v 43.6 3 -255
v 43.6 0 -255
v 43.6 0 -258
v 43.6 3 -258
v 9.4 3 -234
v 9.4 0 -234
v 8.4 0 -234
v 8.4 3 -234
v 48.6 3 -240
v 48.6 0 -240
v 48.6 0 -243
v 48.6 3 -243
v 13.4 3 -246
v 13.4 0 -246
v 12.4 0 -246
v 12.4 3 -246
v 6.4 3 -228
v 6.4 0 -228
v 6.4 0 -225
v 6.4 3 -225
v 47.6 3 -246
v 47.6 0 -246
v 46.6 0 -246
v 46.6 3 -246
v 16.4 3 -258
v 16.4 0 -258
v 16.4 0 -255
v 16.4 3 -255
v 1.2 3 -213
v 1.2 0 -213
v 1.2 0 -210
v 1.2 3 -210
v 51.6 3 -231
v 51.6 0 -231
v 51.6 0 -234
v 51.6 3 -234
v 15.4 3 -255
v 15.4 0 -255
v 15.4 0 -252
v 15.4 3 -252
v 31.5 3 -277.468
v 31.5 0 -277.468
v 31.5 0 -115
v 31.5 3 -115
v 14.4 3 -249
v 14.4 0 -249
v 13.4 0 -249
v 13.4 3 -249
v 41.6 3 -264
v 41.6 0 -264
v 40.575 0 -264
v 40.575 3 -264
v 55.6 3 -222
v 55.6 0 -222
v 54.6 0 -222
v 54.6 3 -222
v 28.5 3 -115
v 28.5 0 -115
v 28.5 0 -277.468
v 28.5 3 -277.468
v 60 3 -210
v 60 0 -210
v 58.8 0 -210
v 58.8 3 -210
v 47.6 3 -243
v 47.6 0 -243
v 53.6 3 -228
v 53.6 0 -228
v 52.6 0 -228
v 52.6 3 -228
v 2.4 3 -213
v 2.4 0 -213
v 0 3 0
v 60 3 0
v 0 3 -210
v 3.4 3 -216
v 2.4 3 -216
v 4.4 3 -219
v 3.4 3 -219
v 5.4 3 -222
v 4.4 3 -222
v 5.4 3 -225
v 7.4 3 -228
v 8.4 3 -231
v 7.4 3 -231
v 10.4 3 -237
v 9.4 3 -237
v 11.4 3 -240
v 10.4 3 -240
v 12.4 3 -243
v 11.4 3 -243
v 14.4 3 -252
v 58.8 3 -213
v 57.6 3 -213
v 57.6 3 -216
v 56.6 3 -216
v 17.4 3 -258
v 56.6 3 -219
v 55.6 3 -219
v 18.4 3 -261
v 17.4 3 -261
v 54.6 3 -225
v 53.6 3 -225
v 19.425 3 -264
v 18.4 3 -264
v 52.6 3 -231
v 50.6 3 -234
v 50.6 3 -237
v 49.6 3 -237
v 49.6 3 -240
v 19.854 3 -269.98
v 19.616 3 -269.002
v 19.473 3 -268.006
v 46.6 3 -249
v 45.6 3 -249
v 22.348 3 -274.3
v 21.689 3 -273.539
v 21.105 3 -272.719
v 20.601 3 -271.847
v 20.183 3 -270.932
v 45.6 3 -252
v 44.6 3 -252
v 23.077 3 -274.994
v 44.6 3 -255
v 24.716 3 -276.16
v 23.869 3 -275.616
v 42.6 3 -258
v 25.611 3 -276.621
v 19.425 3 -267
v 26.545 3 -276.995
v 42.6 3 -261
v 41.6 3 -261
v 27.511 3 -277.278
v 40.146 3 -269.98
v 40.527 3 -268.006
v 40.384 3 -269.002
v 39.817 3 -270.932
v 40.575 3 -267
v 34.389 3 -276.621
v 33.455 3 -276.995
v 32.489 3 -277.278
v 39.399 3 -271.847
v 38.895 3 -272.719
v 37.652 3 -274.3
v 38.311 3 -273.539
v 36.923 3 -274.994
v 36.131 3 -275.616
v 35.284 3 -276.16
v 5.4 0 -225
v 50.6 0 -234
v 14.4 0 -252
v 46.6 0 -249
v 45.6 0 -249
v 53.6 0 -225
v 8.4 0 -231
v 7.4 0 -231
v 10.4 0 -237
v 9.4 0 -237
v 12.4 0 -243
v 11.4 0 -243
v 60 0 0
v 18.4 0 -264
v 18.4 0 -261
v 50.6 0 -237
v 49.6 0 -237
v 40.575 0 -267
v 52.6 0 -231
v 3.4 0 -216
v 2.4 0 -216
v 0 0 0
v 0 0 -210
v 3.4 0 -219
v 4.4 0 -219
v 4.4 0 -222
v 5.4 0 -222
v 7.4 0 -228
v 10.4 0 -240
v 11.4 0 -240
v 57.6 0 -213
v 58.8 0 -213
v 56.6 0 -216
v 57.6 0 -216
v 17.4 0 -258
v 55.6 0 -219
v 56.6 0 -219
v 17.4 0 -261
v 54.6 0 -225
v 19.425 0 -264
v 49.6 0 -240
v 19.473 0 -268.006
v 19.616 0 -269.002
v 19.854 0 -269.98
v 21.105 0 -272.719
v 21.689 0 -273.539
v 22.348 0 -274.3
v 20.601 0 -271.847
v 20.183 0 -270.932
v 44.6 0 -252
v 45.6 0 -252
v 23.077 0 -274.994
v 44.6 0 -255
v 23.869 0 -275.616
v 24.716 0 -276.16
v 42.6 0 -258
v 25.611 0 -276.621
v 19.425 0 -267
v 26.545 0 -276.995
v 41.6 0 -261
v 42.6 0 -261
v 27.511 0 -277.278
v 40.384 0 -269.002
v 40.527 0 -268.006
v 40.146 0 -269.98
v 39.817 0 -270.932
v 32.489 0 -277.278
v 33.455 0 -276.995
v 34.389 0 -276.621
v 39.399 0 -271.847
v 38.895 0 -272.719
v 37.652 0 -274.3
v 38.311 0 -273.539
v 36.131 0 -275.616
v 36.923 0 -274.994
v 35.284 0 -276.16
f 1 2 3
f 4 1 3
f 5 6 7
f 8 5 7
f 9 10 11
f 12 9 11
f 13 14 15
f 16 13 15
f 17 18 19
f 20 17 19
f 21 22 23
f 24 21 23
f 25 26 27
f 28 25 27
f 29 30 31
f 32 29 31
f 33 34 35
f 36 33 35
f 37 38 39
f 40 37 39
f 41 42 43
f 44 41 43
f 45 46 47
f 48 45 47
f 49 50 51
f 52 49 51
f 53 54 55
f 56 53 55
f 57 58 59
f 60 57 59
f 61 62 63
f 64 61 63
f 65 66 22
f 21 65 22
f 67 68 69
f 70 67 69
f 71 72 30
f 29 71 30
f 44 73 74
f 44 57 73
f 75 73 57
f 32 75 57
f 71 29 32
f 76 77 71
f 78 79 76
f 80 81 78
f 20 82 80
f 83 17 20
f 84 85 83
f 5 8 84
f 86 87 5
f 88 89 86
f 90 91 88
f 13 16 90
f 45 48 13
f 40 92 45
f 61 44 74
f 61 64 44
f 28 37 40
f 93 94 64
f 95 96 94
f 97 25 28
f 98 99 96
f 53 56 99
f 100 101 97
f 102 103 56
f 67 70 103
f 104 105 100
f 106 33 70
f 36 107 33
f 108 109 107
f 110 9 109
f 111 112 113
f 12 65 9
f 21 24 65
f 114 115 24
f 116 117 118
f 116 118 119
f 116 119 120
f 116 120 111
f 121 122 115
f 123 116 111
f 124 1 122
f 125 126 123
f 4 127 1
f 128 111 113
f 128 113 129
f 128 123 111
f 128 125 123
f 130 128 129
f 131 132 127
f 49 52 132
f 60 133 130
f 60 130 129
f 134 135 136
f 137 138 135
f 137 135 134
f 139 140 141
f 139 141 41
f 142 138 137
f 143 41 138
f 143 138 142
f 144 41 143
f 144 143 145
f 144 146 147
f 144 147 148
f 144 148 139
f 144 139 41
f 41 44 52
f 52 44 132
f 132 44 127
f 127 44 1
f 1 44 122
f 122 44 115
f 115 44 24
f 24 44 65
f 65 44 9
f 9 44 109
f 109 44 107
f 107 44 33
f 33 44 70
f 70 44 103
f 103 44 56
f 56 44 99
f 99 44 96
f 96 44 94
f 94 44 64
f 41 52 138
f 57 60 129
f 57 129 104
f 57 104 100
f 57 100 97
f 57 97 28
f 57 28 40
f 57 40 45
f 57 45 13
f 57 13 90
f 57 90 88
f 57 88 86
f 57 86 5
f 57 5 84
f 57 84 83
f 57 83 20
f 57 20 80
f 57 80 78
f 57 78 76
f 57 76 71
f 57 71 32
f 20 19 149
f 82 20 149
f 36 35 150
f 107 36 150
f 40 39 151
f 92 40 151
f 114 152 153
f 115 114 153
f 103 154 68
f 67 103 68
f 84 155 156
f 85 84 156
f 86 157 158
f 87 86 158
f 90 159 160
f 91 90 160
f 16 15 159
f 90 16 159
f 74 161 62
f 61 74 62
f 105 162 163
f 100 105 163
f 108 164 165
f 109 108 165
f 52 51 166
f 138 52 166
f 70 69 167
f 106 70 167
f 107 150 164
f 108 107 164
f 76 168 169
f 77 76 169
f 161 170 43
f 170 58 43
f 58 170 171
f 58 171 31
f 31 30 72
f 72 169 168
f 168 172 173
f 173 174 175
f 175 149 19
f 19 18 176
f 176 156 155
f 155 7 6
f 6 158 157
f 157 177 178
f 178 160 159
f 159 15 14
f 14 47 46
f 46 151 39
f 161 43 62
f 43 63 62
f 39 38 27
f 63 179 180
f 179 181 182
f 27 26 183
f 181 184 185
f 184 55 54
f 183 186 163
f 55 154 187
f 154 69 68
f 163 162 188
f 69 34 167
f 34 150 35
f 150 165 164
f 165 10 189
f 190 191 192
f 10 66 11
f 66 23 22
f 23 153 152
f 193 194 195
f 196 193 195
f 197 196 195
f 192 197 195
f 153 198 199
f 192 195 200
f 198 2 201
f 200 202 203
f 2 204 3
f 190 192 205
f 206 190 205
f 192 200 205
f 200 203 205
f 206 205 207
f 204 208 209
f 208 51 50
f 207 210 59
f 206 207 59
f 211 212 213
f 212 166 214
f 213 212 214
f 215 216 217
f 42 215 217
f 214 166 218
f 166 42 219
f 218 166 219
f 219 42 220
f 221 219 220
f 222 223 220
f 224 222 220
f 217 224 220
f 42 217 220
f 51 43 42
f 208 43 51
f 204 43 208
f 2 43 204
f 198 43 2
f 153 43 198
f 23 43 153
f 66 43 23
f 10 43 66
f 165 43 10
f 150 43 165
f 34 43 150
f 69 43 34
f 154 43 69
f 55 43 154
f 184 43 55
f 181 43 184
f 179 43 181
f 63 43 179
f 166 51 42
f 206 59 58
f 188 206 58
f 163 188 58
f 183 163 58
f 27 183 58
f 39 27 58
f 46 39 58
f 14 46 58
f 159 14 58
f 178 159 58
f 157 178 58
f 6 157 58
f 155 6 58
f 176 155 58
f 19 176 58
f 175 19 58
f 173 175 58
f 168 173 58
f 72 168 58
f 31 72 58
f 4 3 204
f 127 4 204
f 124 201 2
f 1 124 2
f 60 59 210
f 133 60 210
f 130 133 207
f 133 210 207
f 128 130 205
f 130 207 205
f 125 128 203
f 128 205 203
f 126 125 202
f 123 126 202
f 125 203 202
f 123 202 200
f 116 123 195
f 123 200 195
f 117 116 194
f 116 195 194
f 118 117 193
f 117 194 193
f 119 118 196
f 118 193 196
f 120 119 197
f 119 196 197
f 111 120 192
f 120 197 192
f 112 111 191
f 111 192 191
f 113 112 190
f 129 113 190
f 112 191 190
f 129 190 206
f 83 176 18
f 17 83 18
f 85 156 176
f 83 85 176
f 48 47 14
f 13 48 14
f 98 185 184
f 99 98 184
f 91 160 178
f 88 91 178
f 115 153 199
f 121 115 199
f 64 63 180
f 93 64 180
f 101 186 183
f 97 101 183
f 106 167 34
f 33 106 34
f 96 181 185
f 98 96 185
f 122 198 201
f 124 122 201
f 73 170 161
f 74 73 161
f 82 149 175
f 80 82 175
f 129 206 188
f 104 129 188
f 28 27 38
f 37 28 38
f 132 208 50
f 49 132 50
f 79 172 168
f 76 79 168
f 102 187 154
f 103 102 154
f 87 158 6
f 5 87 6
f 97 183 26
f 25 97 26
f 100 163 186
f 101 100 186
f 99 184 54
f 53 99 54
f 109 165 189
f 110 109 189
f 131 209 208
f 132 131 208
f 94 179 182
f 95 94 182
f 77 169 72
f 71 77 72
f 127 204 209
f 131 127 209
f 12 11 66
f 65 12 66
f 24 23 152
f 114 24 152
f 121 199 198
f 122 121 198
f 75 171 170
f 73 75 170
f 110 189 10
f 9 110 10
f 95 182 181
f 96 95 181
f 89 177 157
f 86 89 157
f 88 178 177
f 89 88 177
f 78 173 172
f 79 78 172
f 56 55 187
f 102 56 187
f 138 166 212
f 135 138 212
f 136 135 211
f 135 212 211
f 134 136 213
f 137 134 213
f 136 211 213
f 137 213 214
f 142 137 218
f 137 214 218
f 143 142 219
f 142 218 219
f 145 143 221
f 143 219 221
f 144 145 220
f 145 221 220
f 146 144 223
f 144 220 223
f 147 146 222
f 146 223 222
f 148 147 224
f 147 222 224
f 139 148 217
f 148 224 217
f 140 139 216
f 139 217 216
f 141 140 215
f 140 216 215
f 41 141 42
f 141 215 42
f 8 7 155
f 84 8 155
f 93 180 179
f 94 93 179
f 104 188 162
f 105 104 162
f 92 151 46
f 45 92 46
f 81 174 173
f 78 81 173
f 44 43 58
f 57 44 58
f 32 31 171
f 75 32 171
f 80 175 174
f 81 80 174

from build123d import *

# Parameters (mm, degrees)
SALIENTE_EXTRUIR1_DEPTH = 3


with BuildPart() as part:
    # Croquis1 → Saliente-Extruir1 (new body)
    with BuildSketch(Plane(origin=(0, 0, 0), x_dir=(1, 0, 0), z_dir=(0, 1, 0))):
        with BuildLine():
            Line((0, 0), (60, 0))
            Line((60, 0), (60, 210))
            Line((60, 210), (58.8, 210))
            Line((58.8, 210), (58.8, 213))
            Line((58.8, 213), (57.6, 213))
            Line((57.6, 213), (57.6, 216))
            Line((57.6, 216), (56.6, 216))
            Line((56.6, 216), (56.6, 219))
            Line((56.6, 219), (55.6, 219))
            Line((55.6, 219), (55.6, 222))
            Line((55.6, 222), (54.6, 222))
            Line((54.6, 222), (54.6, 225))
            Line((54.6, 225), (53.6, 225))
            Line((53.6, 225), (53.6, 228))
            Line((53.6, 228), (52.6, 228))
            Line((52.6, 228), (52.6, 231))
            Line((52.6, 231), (51.6, 231))
            Line((51.6, 231), (51.6, 234))
            Line((51.6, 234), (50.6, 234))
            Line((50.6, 234), (50.6, 237))
            Line((50.6, 237), (49.6, 237))
            Line((49.6, 237), (49.6, 240))
            Line((49.6, 240), (48.6, 240))
            Line((48.6, 240), (48.6, 243))
            Line((48.6, 243), (47.6, 243))
            Line((47.6, 243), (47.6, 246))
            Line((47.6, 246), (46.6, 246))
            Line((46.6, 246), (46.6, 249))
            Line((46.6, 249), (45.6, 249))
            Line((45.6, 249), (45.6, 252))
            Line((45.6, 252), (44.6, 252))
            Line((44.6, 252), (44.6, 255))
            Line((44.6, 255), (43.6, 255))
            Line((43.6, 255), (43.6, 258))
            Line((43.6, 258), (42.6, 258))
            Line((42.6, 258), (42.6, 261))
            Line((42.6, 261), (41.6, 261))
            Line((41.6, 261), (41.6, 264))
            Line((41.6, 264), (40.575, 264))
            Line((40.575, 264), (40.575, 267))
            ThreePointArc((40.575, 267), (37.990404402, 273.927052945), (31.5, 277.468076471))
            Line((31.5, 277.468076471), (31.5, 115))
            Line((31.5, 115), (28.5, 115))
            Line((28.5, 115), (28.5, 277.468076471))
            ThreePointArc((28.5, 277.468076471), (22.009595598, 273.927052945), (19.425, 267))
            Line((19.425, 267), (19.425, 264))
            Line((19.425, 264), (18.4, 264))
            Line((18.4, 264), (18.4, 261))
            Line((18.4, 261), (17.4, 261))
            Line((17.4, 261), (17.4, 258))
            Line((17.4, 258), (16.4, 258))
            Line((16.4, 258), (16.4, 255))
            Line((16.4, 255), (15.4, 255))
            Line((15.4, 255), (15.4, 252))
            Line((15.4, 252), (14.4, 252))
            Line((14.4, 252), (14.4, 249))
            Line((14.4, 249), (13.4, 249))
            Line((13.4, 249), (13.4, 246))
            Line((13.4, 246), (12.4, 246))
            Line((12.4, 246), (12.4, 243))
            Line((12.4, 243), (11.4, 243))
            Line((11.4, 243), (11.4, 240))
            Line((11.4, 240), (10.4, 240))
            Line((10.4, 240), (10.4, 237))
            Line((10.4, 237), (9.4, 237))
            Line((9.4, 237), (9.4, 234))
            Line((9.4, 234), (8.4, 234))
            Line((8.4, 234), (8.4, 231))
            Line((8.4, 231), (7.4, 231))
            Line((7.4, 231), (7.4, 228))
            Line((7.4, 228), (6.4, 228))
            Line((6.4, 228), (6.4, 225))
            Line((6.4, 225), (5.4, 225))
            Line((5.4, 225), (5.4, 222))
            Line((5.4, 222), (4.4, 222))
            Line((4.4, 222), (4.4, 219))
            Line((4.4, 219), (3.4, 219))
            Line((3.4, 219), (3.4, 216))
            Line((3.4, 216), (2.4, 216))
            Line((2.4, 216), (2.4, 213))
            Line((2.4, 213), (1.2, 213))
            Line((1.2, 213), (1.2, 210))
            Line((1.2, 210), (0, 210))
            Line((0, 210), (0, 0))
        make_face()
    extrude(amount=SALIENTE_EXTRUIR1_DEPTH)


solid = part.part
